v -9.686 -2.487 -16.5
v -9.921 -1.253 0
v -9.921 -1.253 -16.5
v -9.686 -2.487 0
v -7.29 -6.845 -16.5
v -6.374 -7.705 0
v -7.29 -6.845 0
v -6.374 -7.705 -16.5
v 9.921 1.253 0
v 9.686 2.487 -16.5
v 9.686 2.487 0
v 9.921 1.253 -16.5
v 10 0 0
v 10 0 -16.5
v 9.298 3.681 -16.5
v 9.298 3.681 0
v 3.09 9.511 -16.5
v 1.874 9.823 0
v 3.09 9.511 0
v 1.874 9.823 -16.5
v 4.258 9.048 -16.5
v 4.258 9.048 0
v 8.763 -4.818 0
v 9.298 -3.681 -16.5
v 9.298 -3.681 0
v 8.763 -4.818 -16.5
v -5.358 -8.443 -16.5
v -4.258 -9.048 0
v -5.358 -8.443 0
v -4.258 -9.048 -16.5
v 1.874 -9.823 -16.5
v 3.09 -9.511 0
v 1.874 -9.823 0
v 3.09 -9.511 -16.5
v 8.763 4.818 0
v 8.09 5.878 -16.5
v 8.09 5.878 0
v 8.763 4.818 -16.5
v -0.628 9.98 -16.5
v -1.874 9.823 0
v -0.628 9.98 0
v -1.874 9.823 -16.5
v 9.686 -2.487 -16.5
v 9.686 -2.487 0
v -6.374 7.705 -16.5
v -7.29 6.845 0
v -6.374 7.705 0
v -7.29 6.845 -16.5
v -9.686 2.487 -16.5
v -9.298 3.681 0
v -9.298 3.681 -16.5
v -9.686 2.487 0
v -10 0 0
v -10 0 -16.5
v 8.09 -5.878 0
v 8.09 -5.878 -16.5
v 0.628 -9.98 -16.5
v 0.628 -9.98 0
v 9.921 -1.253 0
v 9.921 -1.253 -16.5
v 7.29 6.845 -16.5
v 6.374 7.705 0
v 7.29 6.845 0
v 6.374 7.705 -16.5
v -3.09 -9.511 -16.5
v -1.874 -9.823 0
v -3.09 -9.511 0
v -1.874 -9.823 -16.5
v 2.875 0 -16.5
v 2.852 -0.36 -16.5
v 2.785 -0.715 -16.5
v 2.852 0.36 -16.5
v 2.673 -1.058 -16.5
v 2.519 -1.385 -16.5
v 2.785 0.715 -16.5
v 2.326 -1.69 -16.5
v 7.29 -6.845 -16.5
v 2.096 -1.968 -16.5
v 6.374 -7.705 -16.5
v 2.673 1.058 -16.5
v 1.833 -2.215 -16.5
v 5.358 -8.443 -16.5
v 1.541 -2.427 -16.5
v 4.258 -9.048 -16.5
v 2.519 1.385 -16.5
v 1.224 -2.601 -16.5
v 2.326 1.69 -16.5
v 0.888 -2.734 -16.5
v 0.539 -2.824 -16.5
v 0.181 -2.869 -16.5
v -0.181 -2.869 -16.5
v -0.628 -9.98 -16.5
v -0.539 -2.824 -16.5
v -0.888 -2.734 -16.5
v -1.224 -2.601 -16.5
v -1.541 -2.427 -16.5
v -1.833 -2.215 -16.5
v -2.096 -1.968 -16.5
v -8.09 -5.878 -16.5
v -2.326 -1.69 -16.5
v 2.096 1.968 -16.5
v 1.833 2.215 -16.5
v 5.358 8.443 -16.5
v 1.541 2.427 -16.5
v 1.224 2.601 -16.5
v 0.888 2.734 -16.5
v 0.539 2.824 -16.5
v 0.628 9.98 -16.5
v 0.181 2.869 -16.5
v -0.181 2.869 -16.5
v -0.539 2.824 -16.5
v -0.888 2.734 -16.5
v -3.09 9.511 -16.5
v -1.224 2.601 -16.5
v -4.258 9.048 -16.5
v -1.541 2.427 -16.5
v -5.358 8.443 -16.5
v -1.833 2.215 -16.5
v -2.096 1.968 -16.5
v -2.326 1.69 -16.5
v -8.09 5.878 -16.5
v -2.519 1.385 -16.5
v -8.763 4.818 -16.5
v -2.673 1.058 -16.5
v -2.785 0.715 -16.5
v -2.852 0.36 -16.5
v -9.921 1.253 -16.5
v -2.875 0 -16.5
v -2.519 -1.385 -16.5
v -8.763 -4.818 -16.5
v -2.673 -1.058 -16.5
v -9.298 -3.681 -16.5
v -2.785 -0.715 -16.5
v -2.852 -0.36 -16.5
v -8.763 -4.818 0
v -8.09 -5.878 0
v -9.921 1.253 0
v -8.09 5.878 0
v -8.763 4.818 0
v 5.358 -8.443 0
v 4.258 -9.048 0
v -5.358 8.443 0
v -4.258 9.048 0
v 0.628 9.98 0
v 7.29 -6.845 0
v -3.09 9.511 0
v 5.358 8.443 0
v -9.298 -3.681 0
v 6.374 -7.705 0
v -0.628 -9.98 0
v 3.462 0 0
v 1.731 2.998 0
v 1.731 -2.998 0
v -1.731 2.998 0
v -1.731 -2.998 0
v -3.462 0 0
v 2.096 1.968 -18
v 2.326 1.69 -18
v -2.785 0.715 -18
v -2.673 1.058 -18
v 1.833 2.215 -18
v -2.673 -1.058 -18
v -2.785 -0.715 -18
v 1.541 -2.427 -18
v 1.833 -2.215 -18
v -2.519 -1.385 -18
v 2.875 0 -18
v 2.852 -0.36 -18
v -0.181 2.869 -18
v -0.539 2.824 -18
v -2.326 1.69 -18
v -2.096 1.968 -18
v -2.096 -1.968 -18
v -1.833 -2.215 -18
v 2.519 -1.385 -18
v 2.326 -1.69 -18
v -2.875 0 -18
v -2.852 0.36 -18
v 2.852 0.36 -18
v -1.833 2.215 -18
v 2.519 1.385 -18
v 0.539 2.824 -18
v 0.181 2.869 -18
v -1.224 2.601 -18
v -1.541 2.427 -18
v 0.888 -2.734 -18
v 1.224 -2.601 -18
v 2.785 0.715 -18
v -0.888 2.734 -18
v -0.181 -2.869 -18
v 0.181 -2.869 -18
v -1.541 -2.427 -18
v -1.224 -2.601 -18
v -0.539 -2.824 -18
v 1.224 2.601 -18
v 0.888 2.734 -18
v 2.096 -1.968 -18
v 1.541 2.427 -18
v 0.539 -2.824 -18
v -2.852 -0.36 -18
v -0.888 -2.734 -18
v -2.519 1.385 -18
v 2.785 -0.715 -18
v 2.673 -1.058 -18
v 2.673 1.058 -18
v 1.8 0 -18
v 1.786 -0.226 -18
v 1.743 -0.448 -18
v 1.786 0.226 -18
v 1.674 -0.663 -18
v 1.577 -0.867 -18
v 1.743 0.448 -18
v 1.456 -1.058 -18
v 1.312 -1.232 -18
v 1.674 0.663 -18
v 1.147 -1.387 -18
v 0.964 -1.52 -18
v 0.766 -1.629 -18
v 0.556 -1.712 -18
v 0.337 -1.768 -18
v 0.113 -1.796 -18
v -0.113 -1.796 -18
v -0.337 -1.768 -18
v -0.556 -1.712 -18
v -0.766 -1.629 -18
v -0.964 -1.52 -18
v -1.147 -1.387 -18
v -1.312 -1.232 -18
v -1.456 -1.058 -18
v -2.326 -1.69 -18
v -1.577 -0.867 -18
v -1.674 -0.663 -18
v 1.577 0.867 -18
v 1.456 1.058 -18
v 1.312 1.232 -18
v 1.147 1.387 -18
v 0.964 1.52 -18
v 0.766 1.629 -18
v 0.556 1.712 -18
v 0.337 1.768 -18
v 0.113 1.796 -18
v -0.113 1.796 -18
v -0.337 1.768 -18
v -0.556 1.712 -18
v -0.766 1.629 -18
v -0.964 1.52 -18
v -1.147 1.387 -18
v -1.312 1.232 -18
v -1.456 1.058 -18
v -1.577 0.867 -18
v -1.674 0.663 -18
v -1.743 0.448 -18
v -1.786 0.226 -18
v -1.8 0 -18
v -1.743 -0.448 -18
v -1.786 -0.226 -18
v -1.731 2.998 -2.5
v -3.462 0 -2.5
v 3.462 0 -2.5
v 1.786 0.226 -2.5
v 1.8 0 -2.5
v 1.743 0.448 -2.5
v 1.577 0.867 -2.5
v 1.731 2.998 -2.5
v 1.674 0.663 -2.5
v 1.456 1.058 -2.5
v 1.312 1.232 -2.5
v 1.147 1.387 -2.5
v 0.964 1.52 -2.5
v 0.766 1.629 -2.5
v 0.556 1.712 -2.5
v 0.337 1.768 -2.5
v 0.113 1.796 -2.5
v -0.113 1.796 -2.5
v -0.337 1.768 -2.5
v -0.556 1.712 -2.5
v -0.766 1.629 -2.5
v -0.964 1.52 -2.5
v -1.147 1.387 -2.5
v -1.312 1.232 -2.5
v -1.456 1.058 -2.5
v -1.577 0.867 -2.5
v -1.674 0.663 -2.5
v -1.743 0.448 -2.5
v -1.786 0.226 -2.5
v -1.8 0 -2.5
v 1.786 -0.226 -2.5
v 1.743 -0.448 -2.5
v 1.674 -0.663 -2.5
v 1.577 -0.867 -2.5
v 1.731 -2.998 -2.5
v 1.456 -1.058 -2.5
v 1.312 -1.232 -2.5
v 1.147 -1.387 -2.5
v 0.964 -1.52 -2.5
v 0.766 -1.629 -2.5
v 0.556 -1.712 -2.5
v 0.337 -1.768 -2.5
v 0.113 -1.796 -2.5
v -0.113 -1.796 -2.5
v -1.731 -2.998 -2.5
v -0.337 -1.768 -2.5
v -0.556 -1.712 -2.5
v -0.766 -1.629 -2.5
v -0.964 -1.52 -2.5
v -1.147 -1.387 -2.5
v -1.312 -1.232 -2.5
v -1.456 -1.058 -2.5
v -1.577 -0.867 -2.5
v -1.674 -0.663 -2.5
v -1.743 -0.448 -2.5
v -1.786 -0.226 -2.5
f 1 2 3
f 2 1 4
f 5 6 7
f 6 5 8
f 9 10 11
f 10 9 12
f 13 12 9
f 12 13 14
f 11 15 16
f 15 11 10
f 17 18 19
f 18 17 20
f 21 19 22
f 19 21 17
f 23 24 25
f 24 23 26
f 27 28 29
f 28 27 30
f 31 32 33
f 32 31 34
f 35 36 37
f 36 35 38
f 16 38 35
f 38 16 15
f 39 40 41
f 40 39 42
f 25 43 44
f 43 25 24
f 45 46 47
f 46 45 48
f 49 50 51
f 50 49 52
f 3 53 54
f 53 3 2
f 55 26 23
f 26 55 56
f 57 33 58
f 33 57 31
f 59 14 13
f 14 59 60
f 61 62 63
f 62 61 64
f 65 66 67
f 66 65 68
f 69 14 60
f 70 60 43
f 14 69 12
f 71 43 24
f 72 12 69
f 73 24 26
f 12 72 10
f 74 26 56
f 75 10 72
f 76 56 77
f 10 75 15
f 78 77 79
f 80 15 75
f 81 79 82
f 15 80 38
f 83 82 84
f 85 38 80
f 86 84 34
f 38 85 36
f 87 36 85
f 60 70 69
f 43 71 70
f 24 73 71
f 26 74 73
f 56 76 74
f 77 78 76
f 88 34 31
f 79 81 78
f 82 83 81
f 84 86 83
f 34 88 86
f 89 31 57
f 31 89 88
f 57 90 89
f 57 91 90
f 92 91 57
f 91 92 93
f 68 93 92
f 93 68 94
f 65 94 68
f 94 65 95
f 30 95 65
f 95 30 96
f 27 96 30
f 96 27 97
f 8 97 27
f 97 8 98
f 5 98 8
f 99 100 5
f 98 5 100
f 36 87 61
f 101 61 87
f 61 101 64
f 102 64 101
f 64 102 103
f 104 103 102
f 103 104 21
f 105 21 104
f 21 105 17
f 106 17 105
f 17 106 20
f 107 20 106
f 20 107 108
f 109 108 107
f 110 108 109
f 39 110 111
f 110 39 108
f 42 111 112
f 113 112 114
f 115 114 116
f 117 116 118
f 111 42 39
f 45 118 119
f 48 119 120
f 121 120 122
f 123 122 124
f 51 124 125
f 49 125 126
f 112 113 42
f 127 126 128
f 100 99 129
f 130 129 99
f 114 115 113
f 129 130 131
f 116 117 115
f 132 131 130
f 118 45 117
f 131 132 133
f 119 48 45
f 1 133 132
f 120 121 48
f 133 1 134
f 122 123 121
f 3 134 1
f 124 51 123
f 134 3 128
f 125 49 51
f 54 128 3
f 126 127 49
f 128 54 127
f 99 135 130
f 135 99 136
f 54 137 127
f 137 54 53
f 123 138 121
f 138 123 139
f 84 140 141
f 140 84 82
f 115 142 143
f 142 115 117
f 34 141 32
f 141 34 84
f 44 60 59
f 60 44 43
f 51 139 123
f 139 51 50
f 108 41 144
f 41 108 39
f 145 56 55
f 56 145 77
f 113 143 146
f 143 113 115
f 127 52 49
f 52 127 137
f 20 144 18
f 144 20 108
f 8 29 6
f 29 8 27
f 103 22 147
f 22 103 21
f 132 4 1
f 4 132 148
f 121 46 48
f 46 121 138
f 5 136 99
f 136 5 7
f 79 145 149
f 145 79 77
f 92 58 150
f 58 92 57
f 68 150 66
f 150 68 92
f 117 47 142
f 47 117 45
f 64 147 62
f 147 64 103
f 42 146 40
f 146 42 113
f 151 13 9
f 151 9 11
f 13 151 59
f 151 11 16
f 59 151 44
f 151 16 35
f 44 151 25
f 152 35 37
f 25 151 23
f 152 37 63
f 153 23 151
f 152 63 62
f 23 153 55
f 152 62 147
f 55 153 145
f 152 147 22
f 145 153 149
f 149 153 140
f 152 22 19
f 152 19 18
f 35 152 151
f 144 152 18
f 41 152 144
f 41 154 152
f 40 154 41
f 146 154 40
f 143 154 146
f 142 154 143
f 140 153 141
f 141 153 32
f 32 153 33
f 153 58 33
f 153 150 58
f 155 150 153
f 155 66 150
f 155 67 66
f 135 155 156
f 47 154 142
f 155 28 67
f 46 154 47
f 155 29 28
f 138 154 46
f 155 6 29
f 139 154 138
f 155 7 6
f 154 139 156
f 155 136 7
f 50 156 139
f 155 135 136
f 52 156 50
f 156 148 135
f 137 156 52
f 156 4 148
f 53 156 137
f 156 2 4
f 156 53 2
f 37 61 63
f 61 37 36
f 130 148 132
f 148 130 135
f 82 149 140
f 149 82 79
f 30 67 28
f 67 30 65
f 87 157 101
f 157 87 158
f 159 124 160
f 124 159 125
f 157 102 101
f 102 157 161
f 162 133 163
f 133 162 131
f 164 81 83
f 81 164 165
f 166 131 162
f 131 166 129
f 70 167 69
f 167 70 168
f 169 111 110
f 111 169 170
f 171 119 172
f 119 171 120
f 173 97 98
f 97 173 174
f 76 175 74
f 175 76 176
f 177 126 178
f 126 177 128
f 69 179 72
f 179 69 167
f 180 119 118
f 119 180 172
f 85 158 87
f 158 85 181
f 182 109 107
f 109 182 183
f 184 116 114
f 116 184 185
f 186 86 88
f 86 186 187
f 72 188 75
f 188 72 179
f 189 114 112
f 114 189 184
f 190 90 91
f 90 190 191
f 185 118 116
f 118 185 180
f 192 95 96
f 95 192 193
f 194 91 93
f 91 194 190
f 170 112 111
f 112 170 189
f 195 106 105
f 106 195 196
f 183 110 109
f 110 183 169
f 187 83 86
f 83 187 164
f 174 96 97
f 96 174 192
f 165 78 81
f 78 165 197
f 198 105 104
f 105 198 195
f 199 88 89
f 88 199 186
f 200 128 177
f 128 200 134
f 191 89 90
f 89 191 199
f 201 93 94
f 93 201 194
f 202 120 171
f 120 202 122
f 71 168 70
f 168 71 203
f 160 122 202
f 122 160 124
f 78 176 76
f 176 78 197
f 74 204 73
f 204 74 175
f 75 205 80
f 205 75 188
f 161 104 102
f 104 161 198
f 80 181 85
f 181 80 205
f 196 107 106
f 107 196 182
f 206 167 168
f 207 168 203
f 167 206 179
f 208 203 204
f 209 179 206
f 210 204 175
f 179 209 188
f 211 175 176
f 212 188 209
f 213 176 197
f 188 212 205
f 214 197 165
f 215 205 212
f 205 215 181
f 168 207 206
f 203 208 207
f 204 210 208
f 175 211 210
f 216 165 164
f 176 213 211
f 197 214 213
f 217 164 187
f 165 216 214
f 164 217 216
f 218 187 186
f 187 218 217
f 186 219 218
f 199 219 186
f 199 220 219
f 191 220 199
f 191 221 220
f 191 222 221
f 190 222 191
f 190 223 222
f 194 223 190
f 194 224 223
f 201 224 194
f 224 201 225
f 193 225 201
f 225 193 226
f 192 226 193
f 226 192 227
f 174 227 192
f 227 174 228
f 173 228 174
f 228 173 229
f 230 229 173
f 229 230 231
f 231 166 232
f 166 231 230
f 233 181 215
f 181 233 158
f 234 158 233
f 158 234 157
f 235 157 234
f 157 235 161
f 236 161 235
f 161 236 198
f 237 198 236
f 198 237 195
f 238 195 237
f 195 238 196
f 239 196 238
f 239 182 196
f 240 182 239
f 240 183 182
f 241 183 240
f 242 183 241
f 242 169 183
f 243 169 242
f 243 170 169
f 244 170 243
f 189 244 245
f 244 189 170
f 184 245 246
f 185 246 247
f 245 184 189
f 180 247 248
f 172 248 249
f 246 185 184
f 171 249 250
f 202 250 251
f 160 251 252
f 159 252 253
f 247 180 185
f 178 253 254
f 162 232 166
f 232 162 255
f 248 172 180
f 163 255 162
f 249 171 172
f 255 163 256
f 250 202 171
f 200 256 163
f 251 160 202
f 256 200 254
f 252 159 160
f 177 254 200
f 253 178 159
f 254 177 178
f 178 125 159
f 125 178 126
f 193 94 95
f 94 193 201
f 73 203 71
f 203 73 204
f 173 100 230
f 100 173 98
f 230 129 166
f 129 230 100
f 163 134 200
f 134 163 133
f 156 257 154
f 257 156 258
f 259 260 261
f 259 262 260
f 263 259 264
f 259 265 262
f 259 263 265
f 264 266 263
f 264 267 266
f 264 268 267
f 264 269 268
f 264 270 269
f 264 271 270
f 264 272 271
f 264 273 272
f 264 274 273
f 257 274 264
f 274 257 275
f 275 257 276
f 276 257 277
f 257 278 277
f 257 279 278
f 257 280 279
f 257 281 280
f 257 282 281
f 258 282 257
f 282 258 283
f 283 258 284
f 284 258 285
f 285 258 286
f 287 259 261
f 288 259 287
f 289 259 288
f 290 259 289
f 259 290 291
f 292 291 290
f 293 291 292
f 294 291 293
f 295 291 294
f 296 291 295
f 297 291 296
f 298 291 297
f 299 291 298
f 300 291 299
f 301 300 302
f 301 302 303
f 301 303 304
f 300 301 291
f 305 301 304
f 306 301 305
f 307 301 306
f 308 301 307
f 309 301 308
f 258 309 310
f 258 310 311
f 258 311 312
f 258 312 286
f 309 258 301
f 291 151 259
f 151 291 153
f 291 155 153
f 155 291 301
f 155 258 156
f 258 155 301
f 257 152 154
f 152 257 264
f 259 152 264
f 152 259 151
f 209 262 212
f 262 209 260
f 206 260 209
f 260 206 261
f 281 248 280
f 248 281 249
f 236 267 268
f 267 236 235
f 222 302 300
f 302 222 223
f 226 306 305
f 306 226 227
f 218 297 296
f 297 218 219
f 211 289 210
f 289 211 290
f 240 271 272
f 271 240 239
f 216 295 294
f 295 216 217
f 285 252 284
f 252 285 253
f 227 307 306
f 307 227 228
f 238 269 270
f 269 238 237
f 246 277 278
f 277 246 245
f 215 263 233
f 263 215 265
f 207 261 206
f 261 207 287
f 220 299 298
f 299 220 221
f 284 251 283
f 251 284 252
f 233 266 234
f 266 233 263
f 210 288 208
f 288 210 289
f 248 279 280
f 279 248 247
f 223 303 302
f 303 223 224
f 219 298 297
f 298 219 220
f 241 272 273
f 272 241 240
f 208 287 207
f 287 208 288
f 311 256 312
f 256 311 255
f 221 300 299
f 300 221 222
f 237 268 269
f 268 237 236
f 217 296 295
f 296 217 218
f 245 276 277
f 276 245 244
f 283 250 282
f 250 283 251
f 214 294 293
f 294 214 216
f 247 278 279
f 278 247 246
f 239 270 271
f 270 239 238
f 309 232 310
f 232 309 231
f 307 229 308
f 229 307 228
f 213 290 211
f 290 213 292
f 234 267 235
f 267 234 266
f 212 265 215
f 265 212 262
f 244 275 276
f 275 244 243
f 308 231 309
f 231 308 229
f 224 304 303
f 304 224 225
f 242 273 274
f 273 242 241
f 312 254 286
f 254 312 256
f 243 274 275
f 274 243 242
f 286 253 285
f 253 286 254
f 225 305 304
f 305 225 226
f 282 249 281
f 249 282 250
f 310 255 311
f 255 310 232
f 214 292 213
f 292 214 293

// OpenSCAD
$fn = 50;

difference() {
	union() {
		translate(v = [0, 0, -16.5]) {
			cylinder(h = 16.5, r = 10.0);
		}
		#translate(v = [0, 0, -18.0]) {
			cylinder(h = 18, r = 2.875);
		}
	}
	union() {
		translate(v = [0, 0, 0]) {
			rotate(a = [0, 0, 0]) {
				difference() {
					union() {
						translate(v = [0, 0, -2.5]) {
							linear_extrude(height = 2.5) {
								polygon(points = [[3.4619999999999997, 0.0], [1.7310000000000003, 2.9981799479017264], [-1.7309999999999992, 2.9981799479017264], [-3.4619999999999997, 4.2397272186481365e-16], [-1.7310000000000014, -2.998179947901726], [1.7309999999999977, -2.9981799479017277]]);
							}
						}
					}
					union();
				}
			}
		}
		#translate(v = [0, 0, -100.0]) {
			cylinder(h = 200, r = 1.8);
		}
	}
}
